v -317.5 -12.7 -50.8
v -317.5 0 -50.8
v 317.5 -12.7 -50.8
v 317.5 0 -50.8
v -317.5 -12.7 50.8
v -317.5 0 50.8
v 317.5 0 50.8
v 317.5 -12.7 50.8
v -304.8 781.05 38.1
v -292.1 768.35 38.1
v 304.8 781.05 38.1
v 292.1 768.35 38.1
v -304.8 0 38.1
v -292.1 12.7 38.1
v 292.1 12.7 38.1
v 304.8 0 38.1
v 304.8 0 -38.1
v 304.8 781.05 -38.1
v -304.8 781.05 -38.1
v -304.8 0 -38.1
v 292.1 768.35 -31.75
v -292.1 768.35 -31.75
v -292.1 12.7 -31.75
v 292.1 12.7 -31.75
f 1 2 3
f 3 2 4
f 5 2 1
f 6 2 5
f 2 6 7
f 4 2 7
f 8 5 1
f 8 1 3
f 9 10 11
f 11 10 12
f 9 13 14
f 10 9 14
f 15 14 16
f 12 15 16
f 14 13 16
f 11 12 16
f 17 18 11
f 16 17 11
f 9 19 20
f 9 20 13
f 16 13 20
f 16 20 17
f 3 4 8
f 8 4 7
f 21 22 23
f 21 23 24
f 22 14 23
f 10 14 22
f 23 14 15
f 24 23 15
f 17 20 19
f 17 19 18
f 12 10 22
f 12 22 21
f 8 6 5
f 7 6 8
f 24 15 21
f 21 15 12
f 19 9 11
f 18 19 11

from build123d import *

# Parameters (mm, degrees)
F0_W     = 635
F0_H     = 101.6
F0_W_2   = 609.6
F0_H_2   = 76.2
F1_DEPTH = 12.7
F2_DEPTH = 781.05
F3_W     = 584.2
F3_H     = 755.65
F4_DEPTH = 69.85


with BuildPart() as f1:
    # F0 (on Front) → F1 (new body)
    with BuildSketch(Plane.XZ):
        Rectangle(F0_W, F0_H)
        Rectangle(F0_W_2, F0_H_2, mode=Mode.SUBTRACT)
        Rectangle(F0_W_2, F0_H_2)
    extrude(amount=F1_DEPTH)


with BuildPart() as f2:
    # F0 (on Front) → F2 (new body)
    with BuildSketch(Plane.XZ):
        Rectangle(F0_W_2, F0_H_2)
    extrude(amount=-F2_DEPTH)

    # F3 (on face) → F4 (cut)
    with BuildSketch(Plane.XY.offset(38.1)):
        with Locations((0, 390.525)):
            Rectangle(F3_W, F3_H)
    extrude(amount=-F4_DEPTH, mode=Mode.SUBTRACT)


solid = Compound([f1.part, f2.part])
